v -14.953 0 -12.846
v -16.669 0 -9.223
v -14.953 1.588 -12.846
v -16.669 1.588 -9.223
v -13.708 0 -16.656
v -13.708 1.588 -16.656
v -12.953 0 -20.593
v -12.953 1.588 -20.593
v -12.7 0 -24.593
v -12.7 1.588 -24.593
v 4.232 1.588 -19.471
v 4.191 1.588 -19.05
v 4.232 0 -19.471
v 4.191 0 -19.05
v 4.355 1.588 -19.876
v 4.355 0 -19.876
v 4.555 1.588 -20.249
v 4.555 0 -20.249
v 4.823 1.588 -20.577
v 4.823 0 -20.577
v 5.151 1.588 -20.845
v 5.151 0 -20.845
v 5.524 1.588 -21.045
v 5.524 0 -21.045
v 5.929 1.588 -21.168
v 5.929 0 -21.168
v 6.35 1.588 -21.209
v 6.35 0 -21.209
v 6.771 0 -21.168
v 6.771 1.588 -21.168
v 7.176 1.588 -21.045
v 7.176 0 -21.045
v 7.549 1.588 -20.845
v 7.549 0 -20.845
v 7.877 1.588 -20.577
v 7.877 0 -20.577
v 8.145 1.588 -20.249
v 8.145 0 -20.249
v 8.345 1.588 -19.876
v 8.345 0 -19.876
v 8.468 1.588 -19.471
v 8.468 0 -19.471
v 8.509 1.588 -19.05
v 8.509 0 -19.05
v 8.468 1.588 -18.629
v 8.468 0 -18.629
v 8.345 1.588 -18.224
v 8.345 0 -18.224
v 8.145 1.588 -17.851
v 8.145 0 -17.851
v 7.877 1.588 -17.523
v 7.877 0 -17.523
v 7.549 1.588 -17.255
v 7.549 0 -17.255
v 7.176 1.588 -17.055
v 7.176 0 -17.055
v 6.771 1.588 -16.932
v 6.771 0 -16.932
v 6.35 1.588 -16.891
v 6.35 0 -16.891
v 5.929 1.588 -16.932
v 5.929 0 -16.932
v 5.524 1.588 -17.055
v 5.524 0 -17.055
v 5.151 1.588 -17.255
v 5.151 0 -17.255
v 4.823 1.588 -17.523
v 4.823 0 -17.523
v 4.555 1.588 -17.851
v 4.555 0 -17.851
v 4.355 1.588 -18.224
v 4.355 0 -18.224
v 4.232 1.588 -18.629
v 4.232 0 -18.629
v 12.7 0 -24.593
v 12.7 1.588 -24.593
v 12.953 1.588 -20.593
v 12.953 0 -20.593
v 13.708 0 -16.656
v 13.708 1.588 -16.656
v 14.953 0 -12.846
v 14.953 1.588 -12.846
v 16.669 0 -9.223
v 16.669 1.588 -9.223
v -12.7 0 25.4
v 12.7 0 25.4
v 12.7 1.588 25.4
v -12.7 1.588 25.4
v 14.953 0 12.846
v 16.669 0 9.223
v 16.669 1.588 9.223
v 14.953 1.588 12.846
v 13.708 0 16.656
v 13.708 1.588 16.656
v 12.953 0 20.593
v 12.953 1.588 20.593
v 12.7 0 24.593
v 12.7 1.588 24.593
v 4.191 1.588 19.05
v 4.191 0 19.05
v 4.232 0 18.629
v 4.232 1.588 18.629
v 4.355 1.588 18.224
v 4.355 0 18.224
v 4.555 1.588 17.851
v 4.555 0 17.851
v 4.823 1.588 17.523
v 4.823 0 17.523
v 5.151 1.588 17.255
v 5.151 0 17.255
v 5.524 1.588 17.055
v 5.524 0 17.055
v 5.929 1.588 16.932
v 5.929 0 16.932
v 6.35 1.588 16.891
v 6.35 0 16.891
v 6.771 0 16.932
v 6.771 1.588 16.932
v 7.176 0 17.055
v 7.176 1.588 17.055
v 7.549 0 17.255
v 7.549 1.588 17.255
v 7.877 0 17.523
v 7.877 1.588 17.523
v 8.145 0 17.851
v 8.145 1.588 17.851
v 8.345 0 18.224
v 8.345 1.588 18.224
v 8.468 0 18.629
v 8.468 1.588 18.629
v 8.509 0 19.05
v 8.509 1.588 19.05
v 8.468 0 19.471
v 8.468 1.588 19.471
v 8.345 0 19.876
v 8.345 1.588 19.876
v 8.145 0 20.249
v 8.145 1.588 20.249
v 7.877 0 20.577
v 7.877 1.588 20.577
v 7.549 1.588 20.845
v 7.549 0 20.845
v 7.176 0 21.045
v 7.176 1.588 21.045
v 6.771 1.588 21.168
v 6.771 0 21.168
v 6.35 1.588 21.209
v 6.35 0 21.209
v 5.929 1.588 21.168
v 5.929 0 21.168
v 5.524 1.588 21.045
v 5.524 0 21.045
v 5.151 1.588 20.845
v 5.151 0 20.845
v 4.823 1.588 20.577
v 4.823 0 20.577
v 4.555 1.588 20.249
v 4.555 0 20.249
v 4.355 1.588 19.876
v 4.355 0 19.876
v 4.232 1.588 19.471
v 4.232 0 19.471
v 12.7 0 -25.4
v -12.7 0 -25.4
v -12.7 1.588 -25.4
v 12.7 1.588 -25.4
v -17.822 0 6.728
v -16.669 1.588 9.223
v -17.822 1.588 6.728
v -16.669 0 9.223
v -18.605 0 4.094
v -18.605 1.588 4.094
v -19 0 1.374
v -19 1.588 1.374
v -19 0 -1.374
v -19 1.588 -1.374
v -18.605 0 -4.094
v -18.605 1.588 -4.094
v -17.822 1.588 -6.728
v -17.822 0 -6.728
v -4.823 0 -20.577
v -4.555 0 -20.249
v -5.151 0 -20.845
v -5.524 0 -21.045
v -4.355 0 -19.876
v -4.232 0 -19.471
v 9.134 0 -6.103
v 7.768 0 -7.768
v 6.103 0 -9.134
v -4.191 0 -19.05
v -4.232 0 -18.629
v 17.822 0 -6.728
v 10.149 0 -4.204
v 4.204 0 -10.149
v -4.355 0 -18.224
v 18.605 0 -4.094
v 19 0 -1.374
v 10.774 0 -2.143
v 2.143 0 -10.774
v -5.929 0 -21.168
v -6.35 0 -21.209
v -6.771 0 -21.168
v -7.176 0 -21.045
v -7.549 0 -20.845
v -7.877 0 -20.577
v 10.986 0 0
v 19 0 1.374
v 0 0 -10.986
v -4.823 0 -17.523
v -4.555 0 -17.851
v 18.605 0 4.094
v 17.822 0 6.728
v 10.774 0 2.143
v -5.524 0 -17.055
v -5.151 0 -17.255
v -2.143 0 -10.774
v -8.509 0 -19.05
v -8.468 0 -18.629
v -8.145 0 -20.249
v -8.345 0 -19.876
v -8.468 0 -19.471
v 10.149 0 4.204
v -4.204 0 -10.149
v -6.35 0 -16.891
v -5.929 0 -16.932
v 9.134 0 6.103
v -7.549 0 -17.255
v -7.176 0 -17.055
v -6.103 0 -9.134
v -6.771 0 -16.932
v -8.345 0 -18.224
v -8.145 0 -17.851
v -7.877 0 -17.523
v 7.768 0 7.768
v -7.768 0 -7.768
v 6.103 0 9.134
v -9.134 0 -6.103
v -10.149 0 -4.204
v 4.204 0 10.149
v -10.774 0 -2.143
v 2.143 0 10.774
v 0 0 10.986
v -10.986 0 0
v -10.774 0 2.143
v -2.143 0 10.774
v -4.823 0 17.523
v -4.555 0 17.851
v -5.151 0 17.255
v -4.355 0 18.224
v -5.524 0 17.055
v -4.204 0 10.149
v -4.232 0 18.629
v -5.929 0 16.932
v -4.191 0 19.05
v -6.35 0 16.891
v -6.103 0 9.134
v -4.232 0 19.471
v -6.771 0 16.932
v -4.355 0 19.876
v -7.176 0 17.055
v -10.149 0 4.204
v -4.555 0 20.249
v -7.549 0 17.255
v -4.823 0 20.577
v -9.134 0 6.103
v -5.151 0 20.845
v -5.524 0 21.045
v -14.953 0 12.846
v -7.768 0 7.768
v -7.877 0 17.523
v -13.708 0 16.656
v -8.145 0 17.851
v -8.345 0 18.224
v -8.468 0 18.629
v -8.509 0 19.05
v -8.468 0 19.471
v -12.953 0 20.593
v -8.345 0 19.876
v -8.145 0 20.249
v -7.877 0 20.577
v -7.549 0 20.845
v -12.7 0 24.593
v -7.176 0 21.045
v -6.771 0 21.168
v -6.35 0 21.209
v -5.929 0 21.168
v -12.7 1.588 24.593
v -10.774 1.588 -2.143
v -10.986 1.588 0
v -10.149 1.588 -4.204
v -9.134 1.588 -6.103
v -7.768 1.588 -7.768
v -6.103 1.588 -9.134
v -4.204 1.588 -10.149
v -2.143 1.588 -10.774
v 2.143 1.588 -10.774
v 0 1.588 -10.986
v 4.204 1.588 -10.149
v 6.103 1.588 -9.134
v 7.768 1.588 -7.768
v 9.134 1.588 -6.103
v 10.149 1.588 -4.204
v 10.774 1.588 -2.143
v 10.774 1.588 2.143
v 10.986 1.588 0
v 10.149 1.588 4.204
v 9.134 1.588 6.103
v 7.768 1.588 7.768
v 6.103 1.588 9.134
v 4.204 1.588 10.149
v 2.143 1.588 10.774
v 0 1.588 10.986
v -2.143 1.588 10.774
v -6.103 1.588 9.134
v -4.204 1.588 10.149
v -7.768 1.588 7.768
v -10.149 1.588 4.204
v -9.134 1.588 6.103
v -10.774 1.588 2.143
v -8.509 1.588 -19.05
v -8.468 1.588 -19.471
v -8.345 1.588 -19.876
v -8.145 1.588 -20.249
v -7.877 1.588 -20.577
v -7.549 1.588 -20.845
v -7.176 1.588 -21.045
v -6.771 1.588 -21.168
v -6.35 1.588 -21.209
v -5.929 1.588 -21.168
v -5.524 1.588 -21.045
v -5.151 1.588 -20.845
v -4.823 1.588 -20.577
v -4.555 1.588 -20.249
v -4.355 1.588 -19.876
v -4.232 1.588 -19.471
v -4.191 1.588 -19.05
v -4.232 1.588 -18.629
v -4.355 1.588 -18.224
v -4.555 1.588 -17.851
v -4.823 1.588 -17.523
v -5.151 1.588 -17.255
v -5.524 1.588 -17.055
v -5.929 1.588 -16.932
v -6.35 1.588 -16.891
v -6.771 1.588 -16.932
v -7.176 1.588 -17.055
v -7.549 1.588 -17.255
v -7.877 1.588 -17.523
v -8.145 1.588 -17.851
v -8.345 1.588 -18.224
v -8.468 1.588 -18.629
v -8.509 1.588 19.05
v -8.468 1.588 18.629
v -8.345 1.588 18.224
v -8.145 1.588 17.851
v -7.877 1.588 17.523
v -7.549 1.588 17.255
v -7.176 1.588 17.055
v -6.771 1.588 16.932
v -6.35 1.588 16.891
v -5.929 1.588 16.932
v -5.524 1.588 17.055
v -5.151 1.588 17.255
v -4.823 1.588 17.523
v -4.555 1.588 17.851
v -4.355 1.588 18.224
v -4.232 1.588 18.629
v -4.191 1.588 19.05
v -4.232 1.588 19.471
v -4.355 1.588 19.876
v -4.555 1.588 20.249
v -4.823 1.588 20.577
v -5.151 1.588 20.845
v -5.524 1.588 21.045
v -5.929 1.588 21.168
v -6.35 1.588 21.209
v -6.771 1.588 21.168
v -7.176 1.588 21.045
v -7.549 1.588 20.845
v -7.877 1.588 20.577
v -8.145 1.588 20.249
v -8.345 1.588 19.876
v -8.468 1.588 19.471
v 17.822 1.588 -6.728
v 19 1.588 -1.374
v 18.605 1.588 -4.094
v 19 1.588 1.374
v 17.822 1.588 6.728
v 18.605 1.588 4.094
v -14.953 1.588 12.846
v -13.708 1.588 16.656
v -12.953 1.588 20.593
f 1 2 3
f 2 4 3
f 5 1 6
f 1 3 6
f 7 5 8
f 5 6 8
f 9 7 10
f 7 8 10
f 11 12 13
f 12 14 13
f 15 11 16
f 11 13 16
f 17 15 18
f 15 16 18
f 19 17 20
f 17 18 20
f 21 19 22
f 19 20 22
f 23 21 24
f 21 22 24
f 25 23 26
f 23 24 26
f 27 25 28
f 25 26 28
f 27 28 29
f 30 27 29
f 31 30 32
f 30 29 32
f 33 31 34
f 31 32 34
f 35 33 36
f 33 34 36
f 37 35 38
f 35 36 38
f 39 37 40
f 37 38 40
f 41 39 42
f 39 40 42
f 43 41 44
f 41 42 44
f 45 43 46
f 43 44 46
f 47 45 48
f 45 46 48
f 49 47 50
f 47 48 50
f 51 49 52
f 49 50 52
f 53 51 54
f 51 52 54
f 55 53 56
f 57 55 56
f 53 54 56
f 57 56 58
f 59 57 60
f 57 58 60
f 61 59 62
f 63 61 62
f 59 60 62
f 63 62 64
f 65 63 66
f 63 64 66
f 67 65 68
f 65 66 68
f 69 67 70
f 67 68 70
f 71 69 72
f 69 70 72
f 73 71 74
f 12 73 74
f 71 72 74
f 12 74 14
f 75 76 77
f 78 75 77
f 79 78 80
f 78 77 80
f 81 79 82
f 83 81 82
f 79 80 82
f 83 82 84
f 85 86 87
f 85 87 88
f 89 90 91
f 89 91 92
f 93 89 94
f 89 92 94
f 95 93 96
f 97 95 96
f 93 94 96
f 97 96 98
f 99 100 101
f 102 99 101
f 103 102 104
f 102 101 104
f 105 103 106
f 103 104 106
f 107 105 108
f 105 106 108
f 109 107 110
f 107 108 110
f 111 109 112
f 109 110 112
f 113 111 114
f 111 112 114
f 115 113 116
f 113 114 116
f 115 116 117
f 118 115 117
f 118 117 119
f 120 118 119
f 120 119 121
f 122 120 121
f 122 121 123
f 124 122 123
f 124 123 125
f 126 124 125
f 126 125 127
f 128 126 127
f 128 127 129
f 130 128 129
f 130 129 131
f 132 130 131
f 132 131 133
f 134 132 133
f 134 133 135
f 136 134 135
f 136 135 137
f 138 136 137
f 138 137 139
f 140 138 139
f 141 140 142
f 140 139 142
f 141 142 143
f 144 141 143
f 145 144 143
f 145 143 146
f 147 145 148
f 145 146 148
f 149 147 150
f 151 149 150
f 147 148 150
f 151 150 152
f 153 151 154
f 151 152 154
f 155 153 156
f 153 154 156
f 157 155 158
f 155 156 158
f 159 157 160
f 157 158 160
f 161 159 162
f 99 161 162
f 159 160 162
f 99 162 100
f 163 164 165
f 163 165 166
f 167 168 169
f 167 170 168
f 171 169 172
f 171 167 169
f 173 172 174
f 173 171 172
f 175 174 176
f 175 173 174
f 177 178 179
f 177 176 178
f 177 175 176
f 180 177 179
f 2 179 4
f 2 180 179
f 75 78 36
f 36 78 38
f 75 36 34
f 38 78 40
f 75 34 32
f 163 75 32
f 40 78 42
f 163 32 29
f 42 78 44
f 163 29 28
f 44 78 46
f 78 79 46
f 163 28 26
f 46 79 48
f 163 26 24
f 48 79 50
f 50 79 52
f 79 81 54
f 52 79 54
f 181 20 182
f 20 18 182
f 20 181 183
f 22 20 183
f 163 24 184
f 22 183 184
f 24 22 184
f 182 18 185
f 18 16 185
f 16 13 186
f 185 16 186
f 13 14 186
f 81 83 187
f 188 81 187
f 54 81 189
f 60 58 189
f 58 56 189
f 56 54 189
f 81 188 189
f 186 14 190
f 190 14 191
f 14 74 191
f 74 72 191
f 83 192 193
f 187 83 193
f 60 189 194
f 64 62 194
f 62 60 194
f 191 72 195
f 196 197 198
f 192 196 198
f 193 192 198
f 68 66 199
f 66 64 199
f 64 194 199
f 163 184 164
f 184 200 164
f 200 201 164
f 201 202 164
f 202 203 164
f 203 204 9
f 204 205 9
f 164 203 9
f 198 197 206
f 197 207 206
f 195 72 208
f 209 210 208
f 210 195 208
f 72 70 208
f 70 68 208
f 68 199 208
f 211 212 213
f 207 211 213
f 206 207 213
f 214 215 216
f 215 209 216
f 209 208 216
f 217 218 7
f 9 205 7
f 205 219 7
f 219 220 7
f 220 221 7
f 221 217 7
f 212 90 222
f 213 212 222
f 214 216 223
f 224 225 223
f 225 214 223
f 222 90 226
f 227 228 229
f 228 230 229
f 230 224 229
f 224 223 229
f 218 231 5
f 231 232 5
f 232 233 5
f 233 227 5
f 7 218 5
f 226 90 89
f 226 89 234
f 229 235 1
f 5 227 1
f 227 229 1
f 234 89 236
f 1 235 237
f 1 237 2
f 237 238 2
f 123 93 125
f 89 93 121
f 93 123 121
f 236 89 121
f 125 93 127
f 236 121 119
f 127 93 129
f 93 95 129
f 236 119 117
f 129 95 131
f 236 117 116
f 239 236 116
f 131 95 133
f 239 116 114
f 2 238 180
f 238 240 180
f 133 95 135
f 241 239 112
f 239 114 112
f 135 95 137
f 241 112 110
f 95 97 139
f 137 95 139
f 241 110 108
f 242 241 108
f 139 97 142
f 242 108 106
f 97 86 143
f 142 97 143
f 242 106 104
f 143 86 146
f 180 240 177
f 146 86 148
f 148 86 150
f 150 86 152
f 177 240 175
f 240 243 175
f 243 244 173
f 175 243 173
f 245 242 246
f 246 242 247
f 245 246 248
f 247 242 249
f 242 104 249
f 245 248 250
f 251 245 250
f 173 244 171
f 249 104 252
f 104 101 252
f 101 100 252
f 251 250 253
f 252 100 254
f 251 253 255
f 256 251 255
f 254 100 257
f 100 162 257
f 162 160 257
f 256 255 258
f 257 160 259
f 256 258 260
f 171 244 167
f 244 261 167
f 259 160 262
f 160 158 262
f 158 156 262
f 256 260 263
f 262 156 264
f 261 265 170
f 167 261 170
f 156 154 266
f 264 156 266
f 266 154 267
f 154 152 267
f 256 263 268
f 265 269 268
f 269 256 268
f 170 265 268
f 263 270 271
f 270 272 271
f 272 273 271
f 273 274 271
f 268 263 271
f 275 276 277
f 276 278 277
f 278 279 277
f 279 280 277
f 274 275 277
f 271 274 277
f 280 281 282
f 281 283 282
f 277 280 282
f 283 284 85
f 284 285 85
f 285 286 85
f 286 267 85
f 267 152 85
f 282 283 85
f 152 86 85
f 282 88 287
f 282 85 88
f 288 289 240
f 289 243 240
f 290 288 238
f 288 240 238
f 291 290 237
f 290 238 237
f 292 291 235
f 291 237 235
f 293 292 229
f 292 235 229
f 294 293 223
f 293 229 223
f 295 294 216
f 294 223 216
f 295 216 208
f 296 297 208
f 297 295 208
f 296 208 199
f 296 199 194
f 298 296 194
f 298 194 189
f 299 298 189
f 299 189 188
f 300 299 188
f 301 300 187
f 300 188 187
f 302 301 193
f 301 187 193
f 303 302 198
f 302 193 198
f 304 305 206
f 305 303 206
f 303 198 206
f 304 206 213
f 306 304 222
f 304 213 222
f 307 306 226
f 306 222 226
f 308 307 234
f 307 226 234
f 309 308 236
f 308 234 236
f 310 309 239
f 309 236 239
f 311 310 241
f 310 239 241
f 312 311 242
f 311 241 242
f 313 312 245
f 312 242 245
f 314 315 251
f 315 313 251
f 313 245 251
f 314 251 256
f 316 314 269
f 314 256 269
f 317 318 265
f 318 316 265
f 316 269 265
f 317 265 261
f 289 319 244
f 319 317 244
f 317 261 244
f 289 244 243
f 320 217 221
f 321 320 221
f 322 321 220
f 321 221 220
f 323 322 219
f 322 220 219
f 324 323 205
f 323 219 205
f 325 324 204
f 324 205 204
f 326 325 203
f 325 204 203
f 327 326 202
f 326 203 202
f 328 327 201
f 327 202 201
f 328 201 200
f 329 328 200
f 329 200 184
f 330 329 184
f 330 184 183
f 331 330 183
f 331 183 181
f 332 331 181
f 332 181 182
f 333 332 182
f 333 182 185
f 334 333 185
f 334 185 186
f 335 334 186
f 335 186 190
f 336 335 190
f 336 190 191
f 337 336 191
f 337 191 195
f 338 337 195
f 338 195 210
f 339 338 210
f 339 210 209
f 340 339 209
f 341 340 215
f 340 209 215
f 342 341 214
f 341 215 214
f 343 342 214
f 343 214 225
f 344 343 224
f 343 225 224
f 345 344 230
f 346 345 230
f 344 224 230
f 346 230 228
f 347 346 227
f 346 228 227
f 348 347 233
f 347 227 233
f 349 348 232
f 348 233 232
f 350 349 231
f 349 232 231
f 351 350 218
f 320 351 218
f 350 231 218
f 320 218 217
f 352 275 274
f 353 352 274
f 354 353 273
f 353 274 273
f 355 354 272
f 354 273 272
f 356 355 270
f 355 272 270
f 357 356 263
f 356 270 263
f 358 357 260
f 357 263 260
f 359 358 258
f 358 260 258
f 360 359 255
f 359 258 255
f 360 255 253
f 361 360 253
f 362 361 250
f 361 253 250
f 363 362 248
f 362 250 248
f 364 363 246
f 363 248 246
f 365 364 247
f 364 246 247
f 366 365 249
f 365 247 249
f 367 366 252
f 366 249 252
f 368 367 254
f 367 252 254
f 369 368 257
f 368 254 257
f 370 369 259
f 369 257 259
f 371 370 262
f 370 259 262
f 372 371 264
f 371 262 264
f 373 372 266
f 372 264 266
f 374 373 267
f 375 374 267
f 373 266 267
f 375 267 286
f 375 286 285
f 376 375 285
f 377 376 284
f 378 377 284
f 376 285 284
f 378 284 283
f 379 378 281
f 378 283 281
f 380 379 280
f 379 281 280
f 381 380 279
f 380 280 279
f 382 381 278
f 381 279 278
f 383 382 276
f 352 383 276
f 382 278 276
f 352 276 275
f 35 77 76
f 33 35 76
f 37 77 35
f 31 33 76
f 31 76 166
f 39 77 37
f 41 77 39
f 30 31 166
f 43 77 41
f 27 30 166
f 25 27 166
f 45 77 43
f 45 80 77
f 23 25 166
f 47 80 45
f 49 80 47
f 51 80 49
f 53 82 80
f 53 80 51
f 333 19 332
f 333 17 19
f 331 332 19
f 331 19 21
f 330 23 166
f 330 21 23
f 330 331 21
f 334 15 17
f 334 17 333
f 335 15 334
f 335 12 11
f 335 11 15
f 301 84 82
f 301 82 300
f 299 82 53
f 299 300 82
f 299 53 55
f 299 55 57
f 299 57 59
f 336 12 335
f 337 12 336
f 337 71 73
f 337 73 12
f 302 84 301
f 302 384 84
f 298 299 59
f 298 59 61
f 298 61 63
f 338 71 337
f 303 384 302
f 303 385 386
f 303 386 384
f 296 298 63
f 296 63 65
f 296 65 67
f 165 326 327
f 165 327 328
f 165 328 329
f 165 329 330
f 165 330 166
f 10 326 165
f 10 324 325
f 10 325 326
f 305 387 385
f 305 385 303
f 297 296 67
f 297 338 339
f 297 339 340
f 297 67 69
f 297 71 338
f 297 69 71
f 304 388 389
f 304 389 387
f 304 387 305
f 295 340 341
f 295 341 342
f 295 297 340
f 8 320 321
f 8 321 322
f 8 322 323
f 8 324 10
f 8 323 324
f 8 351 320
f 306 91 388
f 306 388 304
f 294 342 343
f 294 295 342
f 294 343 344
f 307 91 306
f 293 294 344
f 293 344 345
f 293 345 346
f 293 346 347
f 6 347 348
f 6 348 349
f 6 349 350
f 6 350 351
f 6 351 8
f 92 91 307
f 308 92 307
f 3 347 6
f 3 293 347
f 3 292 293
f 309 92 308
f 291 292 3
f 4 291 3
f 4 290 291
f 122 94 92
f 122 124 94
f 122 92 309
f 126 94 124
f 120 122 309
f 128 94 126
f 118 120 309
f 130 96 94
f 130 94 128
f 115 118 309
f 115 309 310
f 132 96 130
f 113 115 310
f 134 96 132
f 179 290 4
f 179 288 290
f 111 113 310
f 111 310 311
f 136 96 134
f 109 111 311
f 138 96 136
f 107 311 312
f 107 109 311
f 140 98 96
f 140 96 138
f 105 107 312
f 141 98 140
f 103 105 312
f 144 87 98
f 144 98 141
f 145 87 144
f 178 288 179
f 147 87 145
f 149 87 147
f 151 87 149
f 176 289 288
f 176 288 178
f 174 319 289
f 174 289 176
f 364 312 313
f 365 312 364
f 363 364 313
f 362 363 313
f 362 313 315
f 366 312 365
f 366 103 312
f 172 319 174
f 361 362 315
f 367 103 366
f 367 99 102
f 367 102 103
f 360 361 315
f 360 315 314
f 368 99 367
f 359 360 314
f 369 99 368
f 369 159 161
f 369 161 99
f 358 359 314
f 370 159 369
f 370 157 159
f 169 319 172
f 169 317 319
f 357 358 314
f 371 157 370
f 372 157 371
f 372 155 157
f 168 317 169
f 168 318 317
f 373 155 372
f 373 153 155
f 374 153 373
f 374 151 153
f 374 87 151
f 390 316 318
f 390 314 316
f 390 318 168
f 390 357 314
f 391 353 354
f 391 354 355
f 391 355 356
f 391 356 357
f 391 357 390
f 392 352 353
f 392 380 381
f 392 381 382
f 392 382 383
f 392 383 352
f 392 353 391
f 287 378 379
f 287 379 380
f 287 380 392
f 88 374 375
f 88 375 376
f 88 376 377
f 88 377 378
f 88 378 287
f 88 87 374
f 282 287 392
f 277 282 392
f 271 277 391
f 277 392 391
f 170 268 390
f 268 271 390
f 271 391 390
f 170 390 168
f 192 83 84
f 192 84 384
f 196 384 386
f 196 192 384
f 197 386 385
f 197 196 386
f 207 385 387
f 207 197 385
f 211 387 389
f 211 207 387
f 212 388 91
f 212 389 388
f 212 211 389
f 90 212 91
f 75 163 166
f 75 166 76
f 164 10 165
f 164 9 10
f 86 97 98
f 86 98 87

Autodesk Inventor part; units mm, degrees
ref_plane "YZ Plane" through (0, 0, 0) normal (1, 0, 0) x (0, 1, 0)
ref_plane "XZ Plane" through (0, 0, 0) normal (0, 1, 0) x (-1, 0, 0)
ref_plane "XY Plane" through (0, 0, 0) normal (0, 0, 1) x (1, 0, 0)
sketch "Sketch1" plane through (0, 0, 0) normal (0, 1, 0) x (-1, 0, 0)
  circle A0 centre (0, 0) radius 10.9855
  line L0 (12.7, -25.4) -> (-12.7, -25.4)
  line L1 (-12.7, -25.4) -> (-12.7, 25.4)
  line L2 (-12.7, 25.4) -> (12.7, 25.4)
  line L3 (12.7, 25.4) -> (12.7, -25.4)
  line L4 (12.7, -25.4) -> (-12.7, 25.4) construction
  line L5 (-12.7, -25.4) -> (12.7, 25.4) construction
  circle A1 centre (0, 0) radius 19.05
  circle A2 centre (-6.35, -19.05) radius 2.159
  circle A3 centre (6.35, -19.05) radius 2.159
  circle A4 centre (-6.35, 19.05) radius 2.159
  circle A5 centre (6.35, 19.05) radius 2.159
  point P0 (-12.7, -14.199)
  point P1 (12.7, -14.199)
  point P2 (12.7, 14.199)
  point P3 (-12.7, 14.199)
  dimension "d0" = 21.971
  dimension "d1" = 25.4
  dimension "d2" = 50.8
  dimension "d3" = 38.1
  dimension "d4" = 4.318
  dimension "d5" = 6.35
  dimension "d6" = 6.35
  dimension "d9" = 12.7
  dimension "d12" = 38.1
extrude "Extrusion1" add sketch "Sketch1" along normal blind 1.5875 contours L0 L1 A1 A2 A3 L3 | A1 A3 A2 L1 A4 A5 L3 | L3 A1 | A1 L1 | A1 A5 A4 L1 L2 L3
fillet "Fillet1" radius 31.75 4 edges at (12.7, 0.7937, 14.199) (12.7, 0.7937, -14.199) (-12.7, 0.7937, -14.199) (-12.7, 0.7937, 14.199)
properties part number "ball bearing holder" material "Acetal Resin, Black"
